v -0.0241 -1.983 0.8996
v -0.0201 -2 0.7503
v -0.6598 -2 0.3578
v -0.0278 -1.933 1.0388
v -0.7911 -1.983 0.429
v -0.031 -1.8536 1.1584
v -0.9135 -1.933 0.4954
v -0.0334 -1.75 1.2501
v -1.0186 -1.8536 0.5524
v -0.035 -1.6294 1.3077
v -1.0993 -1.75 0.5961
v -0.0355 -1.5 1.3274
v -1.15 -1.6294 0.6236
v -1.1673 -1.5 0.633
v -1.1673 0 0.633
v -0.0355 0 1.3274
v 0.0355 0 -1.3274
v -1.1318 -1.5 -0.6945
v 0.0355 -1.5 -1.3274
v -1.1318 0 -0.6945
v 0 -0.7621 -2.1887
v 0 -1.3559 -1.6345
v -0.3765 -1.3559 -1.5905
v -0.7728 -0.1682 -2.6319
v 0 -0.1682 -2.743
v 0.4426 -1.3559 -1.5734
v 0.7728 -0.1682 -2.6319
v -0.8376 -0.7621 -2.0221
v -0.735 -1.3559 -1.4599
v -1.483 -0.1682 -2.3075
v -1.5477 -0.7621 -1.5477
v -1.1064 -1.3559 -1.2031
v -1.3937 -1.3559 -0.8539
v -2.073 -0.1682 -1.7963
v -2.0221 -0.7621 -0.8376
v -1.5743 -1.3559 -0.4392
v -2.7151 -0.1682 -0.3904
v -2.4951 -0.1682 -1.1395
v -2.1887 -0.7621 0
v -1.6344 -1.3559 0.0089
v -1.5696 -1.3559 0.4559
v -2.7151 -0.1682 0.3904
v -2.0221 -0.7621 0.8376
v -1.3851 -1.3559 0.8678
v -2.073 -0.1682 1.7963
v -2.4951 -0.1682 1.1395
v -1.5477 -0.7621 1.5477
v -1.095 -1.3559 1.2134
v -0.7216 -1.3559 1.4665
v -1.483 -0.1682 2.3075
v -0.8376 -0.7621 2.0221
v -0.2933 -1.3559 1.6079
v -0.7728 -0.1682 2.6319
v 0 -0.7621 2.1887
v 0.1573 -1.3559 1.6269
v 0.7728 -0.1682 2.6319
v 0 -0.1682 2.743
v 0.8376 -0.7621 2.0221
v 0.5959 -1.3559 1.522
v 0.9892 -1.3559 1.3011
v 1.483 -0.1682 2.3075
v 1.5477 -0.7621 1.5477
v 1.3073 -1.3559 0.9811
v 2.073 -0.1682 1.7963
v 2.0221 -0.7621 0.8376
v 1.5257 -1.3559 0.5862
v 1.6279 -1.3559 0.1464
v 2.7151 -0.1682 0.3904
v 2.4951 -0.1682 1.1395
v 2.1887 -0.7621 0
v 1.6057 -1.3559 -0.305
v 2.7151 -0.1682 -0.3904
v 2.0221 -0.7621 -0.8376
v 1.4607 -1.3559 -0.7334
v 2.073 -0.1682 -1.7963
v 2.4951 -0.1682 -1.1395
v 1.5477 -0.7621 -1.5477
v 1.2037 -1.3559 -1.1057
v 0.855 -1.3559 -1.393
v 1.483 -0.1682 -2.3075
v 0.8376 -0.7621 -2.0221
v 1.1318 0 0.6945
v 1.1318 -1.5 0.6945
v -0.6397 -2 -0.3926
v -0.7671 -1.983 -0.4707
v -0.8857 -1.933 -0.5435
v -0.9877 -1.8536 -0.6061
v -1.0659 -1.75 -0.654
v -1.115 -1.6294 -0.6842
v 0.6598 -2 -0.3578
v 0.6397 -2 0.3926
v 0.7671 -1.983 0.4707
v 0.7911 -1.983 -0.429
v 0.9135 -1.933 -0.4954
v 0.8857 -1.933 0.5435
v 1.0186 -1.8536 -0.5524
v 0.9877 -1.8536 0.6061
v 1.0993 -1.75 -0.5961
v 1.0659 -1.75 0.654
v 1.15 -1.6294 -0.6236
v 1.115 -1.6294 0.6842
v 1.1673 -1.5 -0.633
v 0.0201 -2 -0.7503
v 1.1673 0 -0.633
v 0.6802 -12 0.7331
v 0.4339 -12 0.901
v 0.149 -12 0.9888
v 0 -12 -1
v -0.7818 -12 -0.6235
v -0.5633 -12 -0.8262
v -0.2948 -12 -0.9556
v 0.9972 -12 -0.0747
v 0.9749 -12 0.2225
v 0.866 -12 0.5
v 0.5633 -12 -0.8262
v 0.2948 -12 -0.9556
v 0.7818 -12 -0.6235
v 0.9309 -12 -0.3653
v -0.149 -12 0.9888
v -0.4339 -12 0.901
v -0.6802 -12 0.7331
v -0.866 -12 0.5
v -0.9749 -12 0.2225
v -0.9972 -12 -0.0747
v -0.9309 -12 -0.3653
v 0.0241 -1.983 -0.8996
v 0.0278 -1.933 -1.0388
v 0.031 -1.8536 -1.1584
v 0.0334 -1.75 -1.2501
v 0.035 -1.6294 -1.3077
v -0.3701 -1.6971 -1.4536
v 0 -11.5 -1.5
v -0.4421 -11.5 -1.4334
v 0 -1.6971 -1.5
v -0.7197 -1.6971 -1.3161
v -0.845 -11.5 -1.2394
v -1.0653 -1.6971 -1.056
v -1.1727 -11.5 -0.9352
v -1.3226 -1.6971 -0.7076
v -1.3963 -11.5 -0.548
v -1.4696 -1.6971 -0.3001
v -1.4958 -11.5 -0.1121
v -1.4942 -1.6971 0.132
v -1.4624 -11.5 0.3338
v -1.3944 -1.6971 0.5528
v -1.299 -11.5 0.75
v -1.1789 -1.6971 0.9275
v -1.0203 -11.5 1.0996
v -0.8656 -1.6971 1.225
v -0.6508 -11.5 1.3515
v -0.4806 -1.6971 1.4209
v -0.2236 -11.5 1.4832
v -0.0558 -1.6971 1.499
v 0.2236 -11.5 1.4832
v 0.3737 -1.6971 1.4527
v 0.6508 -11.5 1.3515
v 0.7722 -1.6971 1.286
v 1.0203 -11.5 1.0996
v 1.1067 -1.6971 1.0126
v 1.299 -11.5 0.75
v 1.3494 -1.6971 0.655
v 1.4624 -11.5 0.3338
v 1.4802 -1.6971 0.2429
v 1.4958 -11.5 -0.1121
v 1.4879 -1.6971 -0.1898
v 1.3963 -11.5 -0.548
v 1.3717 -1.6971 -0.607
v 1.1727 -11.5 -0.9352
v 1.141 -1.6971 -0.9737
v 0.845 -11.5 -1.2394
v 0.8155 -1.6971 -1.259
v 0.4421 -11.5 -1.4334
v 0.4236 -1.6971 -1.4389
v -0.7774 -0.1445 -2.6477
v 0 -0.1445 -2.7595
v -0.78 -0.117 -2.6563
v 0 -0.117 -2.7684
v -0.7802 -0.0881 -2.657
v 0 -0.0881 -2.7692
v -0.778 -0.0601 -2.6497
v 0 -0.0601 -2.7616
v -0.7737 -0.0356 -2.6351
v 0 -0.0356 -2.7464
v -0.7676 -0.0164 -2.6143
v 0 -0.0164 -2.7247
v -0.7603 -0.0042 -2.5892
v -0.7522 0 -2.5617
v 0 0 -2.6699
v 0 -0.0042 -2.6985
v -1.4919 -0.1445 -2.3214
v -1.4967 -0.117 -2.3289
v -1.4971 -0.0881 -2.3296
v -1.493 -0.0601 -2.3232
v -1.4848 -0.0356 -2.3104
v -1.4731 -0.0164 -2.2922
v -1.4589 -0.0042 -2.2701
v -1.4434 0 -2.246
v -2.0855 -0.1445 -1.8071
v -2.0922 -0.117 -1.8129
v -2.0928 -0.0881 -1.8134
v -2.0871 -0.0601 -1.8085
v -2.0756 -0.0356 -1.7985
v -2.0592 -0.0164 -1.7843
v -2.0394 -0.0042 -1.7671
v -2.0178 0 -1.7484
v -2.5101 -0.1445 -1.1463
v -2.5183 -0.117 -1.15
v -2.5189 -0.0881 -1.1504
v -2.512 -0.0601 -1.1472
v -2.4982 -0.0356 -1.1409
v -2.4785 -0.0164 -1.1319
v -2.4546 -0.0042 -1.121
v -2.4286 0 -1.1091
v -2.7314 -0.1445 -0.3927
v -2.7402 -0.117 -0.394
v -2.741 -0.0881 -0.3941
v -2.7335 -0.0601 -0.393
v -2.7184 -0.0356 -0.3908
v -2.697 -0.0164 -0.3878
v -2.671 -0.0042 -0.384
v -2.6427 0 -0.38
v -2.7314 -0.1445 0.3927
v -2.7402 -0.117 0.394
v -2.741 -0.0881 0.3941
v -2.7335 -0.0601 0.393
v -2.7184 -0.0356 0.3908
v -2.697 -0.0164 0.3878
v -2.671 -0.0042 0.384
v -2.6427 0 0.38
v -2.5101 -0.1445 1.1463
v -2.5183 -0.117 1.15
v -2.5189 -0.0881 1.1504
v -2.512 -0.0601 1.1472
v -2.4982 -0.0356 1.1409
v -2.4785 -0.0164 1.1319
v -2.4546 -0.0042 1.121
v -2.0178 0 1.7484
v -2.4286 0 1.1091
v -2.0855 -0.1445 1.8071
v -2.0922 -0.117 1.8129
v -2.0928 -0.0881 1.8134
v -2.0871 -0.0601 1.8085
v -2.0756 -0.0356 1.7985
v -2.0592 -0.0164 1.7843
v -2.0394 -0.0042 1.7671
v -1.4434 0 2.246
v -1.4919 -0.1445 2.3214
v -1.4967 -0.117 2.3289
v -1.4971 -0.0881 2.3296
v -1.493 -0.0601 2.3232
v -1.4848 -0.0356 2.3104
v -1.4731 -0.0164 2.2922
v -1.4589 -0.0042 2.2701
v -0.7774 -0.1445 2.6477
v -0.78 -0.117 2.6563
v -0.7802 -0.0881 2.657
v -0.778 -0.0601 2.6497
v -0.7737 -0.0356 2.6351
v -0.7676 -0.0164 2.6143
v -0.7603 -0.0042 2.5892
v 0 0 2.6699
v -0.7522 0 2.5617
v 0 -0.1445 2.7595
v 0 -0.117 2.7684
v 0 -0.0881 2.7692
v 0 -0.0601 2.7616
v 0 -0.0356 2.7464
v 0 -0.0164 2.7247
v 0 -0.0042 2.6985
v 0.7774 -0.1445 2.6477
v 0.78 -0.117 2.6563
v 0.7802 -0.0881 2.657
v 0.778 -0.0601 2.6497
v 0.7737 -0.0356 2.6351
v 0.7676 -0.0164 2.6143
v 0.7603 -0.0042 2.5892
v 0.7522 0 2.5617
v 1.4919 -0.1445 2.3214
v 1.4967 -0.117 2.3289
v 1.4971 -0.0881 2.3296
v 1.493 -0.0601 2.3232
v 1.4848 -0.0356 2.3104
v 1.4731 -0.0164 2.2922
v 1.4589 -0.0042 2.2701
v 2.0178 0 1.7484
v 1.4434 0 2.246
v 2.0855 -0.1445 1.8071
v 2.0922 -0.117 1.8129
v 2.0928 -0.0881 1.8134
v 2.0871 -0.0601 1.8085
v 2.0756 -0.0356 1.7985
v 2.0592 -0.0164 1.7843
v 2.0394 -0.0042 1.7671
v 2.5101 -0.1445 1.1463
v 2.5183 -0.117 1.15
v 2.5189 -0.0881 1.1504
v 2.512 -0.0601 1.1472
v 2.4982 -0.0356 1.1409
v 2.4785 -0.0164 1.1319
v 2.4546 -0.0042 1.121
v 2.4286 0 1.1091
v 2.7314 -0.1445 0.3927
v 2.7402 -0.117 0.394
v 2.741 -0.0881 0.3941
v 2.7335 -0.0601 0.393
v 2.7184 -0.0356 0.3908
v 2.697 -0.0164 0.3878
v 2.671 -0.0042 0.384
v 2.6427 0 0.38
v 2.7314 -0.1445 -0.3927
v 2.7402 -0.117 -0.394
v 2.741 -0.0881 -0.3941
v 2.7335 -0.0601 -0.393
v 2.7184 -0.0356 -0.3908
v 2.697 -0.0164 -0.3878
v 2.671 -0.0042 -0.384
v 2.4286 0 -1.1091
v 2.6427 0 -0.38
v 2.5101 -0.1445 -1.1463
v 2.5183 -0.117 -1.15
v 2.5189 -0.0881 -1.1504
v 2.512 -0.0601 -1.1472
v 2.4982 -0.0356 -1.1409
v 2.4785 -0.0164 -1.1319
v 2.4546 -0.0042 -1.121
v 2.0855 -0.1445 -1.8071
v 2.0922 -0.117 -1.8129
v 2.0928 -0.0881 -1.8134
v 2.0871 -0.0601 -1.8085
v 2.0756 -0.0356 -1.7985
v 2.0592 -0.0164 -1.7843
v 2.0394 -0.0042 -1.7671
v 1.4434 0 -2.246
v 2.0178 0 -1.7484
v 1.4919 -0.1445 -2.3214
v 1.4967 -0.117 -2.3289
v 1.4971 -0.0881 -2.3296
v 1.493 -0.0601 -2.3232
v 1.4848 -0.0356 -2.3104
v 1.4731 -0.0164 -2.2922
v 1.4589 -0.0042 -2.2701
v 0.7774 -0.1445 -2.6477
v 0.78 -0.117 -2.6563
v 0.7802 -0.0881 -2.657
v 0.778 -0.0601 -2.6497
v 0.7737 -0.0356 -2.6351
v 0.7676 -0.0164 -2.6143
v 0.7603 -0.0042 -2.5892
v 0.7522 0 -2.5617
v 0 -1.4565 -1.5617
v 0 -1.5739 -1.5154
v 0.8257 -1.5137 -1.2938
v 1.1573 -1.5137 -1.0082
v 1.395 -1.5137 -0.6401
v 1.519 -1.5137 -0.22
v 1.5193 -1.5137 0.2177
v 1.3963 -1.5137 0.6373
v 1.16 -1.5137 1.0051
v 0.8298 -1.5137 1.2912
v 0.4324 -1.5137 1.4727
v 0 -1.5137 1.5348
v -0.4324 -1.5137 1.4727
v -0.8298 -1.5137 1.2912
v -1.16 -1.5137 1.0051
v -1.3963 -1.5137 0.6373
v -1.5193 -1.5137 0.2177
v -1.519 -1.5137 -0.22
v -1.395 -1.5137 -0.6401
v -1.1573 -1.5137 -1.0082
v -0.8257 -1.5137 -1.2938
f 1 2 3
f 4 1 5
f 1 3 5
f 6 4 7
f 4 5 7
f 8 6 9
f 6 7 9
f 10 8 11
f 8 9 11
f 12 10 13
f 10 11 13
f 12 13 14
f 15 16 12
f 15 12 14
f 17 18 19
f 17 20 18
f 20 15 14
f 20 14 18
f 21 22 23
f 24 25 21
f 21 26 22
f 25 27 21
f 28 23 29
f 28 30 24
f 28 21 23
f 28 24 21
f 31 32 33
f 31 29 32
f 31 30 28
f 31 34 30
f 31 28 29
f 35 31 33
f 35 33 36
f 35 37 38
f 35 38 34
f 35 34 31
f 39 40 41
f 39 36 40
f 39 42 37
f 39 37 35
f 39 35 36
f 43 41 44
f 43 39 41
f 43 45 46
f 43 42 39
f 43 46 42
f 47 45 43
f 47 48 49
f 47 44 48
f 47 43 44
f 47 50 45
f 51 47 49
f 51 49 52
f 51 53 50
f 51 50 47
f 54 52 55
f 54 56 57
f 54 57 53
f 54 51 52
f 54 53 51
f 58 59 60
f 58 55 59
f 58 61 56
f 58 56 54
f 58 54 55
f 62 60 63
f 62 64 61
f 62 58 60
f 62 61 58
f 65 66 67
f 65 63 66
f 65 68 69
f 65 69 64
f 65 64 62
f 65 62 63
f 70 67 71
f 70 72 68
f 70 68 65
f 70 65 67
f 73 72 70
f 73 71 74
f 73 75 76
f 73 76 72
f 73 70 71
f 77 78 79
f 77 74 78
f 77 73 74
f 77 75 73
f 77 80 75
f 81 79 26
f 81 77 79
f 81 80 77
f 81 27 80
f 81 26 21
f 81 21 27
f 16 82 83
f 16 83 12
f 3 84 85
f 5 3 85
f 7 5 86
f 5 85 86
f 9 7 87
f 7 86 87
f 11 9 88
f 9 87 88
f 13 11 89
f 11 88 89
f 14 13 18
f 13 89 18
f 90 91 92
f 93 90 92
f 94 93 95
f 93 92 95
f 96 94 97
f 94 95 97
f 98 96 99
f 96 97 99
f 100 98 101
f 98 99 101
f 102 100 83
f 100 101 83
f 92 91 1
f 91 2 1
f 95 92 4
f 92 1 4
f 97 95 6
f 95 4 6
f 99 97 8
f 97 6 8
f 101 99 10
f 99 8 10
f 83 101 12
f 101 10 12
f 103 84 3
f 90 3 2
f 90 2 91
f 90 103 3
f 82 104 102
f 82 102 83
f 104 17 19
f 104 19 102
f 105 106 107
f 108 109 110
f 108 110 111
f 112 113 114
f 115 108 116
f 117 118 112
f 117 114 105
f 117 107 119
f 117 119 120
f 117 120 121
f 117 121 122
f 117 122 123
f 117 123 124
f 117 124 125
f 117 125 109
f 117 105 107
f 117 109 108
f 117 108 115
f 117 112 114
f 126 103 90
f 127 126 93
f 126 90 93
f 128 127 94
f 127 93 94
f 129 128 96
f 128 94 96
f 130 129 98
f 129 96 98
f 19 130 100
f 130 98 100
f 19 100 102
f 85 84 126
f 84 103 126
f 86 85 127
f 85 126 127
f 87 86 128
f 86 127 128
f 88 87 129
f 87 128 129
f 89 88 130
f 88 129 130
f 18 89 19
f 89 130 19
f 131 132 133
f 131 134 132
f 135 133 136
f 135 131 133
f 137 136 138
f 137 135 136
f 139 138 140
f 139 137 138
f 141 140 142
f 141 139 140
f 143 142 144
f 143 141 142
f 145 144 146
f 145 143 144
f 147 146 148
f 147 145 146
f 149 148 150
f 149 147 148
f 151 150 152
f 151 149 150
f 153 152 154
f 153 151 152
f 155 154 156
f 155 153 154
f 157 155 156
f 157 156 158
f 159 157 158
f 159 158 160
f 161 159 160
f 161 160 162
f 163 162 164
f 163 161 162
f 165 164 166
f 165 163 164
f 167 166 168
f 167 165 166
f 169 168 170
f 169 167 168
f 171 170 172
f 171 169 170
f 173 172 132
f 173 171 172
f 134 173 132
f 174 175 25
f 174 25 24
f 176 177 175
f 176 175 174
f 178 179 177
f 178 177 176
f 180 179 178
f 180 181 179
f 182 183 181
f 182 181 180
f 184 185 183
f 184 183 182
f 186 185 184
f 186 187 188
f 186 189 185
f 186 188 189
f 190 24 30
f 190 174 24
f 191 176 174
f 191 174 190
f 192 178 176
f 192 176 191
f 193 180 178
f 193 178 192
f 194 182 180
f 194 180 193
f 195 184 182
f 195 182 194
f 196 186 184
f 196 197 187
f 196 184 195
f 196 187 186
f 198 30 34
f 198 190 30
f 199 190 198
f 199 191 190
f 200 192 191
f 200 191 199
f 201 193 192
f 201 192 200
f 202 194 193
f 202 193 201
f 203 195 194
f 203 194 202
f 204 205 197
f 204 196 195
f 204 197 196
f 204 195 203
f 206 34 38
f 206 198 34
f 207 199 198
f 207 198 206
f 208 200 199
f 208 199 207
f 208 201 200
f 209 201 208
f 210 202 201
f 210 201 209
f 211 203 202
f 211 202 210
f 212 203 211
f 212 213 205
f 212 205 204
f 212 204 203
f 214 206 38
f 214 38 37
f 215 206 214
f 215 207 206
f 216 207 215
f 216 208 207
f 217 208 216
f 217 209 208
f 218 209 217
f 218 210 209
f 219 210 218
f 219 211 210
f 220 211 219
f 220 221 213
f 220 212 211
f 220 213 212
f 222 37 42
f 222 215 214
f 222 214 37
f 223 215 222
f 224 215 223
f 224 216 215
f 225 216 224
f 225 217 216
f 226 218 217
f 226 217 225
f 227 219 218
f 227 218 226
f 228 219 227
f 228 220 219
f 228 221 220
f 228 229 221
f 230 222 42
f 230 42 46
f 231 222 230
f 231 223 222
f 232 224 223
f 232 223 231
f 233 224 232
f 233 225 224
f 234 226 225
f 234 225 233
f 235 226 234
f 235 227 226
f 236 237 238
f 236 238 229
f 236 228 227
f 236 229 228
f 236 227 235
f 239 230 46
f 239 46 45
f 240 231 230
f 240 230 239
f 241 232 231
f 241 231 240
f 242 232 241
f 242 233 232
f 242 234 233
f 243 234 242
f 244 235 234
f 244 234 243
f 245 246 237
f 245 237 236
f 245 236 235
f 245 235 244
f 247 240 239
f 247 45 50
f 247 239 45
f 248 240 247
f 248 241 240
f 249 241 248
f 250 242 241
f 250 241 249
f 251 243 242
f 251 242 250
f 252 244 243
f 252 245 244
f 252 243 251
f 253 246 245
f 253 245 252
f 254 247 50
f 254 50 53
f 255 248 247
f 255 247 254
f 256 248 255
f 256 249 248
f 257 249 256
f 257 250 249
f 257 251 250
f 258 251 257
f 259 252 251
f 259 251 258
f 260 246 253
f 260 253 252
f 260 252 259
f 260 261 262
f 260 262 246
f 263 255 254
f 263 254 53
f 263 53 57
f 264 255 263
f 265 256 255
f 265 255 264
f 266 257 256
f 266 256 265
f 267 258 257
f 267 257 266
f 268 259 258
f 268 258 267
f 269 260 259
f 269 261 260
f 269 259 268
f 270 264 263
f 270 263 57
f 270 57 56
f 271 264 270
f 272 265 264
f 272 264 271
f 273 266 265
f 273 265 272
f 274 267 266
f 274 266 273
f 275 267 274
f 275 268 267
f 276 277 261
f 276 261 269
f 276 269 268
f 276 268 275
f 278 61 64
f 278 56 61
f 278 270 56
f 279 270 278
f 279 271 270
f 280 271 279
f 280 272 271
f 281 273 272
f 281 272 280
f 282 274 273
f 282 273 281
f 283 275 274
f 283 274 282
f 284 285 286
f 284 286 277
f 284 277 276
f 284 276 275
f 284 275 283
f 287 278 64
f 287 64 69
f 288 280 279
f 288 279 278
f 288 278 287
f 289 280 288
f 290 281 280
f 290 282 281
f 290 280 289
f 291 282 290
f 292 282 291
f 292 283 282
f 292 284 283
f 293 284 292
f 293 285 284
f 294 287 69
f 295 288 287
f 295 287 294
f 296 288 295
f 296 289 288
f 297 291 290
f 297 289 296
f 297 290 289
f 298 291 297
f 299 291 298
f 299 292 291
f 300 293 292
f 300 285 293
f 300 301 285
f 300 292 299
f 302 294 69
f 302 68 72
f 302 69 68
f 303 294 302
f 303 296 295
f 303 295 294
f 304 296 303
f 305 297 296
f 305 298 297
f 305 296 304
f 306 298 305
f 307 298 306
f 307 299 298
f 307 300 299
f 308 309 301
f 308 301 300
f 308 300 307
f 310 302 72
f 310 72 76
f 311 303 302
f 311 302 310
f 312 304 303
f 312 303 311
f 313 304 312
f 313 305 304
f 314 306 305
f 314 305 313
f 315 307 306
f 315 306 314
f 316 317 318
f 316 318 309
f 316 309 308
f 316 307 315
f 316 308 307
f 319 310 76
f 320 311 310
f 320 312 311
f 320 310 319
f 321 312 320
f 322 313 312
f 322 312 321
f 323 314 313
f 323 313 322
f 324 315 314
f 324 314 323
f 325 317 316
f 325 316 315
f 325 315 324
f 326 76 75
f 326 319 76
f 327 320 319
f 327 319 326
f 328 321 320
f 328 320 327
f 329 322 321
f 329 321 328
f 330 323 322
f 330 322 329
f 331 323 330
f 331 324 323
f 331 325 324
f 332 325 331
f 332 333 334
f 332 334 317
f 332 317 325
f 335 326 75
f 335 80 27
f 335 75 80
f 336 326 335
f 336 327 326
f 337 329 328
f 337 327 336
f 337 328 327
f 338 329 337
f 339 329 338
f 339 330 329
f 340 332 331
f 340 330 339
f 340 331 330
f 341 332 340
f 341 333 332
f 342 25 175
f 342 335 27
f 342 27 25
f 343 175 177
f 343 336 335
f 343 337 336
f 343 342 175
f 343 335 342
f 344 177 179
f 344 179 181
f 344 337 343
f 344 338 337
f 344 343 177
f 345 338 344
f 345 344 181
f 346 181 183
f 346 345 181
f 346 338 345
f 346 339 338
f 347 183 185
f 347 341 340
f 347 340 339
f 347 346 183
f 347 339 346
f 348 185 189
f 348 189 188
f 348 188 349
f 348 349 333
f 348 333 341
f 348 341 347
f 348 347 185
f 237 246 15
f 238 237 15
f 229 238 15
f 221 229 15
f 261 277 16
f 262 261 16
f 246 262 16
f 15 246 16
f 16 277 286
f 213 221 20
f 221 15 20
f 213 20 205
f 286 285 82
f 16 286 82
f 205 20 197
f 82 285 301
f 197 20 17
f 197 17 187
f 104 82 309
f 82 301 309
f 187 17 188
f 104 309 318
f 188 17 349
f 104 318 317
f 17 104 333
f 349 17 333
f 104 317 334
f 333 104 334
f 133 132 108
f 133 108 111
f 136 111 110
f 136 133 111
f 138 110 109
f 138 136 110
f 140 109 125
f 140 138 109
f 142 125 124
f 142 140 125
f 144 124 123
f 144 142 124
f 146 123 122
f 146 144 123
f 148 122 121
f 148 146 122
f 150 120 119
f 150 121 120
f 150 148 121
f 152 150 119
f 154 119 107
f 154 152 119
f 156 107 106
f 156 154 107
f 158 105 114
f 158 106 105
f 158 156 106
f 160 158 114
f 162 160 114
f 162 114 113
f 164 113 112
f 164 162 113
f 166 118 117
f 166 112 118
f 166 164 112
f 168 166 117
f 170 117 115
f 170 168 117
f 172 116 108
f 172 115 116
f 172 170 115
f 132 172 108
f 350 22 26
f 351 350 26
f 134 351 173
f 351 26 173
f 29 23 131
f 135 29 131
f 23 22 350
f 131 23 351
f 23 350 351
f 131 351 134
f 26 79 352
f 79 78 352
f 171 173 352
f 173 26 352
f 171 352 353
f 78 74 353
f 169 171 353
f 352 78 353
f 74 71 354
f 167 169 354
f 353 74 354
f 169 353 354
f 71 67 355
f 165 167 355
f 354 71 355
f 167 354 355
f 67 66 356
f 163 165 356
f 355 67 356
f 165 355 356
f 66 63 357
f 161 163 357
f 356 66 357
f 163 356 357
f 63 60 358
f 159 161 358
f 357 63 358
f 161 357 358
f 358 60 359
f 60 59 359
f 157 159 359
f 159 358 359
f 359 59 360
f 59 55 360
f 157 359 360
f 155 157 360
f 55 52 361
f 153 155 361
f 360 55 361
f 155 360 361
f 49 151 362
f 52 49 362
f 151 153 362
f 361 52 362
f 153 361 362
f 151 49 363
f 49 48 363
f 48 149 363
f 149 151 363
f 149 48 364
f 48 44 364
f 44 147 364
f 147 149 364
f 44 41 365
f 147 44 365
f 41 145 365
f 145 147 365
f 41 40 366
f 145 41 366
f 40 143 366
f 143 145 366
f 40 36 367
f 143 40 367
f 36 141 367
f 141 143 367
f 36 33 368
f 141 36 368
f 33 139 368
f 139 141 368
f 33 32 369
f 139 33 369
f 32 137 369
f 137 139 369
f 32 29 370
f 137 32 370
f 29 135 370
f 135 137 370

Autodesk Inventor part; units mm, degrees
ref_plane "YZ Plane" through (0, 0, 0) normal (1, 0, 0) x (0, 1, 0)
ref_plane "XZ Plane" through (0, 0, 0) normal (0, 1, 0) x (-1, 0, 0)
ref_plane "XY Plane" through (0, 0, 0) normal (0, 0, 1) x (1, 0, 0)
sketch "Szkic2" plane through (0, 0, 0) normal (1, 0, 0) x (0, 1, 0)
  line L0 (0, -2.9) -> (0, 2.9)
  line L1 (-1.5, -1.5) -> (-1.5, 1.5)
  line L2 (-1.5, -1.5) -> (0, -2.9)
  line L3 (-1.5, 1.5) -> (0, 2.9)
  line L4 (0, 0) -> (-12, 0)
  line L5 (-12, 0) -> (-12, -1.5)
  line L6 (-12, -1.5) -> (-1.5, -1.5)
  dimension "d0" = 5.8
  dimension "d2" = 3
  dimension "d3" = 1.5
  dimension "d4" = 12
  dimension "d5" = 1.5
revolve "Obrót1" add sketch "Szkic2" angle 360 about axis through (0, 0, 0) along (0, -1, 0) contours L2 L1 L4 L0 | L6 L5 L4 L1
sketch "Szkic3" plane through (0, 0, 0) normal (0, 1, 0) x (1, 0, 0)
  line L0 (-1.1673, -0.633) -> (-1.1318, 0.6945)
  line L1 (-1.1318, 0.6945) -> (0.0355, 1.3274)
  line L2 (0.0355, 1.3274) -> (1.1673, 0.633)
  line L3 (1.1673, 0.633) -> (1.1318, -0.6945)
  line L4 (1.1318, -0.6945) -> (-0.0355, -1.3274)
  line L5 (-0.0355, -1.3274) -> (-1.1673, -0.633)
  point P0 (0, 0)
  point P1 (0, 0)
  dimension "d7" = 2.3
extrude "Wyciągnięcie proste1" cut sketch "Szkic3" against normal blind 2
fillet "Zaokrąglenie1" radius 0.5 6 edges at (-1.1496, -2, -0.0308) (-0.6014, -2, 0.9802) (-0.5482, -2, -1.011) (0.6014, -2, -0.9802) (0.5482, -2, 1.011) (1.1496, -2, 0.0308)
fillet "Zaokrąglenie2" radius 0.5 1 edges at (0, -1.5, 1.5)
fillet "Zaokrąglenie3" radius 0.1 1 edges at (0, 0, 2.9)
thread "Gwint1" size "M3x0.5" class "6g" standard "ANSI Metric M Profile" full length
chamfer "Faza1" distance 0.5 angle 45 1 edges at (0, -12, 1.5)
properties part number "Screw M3 12mm flat head"
